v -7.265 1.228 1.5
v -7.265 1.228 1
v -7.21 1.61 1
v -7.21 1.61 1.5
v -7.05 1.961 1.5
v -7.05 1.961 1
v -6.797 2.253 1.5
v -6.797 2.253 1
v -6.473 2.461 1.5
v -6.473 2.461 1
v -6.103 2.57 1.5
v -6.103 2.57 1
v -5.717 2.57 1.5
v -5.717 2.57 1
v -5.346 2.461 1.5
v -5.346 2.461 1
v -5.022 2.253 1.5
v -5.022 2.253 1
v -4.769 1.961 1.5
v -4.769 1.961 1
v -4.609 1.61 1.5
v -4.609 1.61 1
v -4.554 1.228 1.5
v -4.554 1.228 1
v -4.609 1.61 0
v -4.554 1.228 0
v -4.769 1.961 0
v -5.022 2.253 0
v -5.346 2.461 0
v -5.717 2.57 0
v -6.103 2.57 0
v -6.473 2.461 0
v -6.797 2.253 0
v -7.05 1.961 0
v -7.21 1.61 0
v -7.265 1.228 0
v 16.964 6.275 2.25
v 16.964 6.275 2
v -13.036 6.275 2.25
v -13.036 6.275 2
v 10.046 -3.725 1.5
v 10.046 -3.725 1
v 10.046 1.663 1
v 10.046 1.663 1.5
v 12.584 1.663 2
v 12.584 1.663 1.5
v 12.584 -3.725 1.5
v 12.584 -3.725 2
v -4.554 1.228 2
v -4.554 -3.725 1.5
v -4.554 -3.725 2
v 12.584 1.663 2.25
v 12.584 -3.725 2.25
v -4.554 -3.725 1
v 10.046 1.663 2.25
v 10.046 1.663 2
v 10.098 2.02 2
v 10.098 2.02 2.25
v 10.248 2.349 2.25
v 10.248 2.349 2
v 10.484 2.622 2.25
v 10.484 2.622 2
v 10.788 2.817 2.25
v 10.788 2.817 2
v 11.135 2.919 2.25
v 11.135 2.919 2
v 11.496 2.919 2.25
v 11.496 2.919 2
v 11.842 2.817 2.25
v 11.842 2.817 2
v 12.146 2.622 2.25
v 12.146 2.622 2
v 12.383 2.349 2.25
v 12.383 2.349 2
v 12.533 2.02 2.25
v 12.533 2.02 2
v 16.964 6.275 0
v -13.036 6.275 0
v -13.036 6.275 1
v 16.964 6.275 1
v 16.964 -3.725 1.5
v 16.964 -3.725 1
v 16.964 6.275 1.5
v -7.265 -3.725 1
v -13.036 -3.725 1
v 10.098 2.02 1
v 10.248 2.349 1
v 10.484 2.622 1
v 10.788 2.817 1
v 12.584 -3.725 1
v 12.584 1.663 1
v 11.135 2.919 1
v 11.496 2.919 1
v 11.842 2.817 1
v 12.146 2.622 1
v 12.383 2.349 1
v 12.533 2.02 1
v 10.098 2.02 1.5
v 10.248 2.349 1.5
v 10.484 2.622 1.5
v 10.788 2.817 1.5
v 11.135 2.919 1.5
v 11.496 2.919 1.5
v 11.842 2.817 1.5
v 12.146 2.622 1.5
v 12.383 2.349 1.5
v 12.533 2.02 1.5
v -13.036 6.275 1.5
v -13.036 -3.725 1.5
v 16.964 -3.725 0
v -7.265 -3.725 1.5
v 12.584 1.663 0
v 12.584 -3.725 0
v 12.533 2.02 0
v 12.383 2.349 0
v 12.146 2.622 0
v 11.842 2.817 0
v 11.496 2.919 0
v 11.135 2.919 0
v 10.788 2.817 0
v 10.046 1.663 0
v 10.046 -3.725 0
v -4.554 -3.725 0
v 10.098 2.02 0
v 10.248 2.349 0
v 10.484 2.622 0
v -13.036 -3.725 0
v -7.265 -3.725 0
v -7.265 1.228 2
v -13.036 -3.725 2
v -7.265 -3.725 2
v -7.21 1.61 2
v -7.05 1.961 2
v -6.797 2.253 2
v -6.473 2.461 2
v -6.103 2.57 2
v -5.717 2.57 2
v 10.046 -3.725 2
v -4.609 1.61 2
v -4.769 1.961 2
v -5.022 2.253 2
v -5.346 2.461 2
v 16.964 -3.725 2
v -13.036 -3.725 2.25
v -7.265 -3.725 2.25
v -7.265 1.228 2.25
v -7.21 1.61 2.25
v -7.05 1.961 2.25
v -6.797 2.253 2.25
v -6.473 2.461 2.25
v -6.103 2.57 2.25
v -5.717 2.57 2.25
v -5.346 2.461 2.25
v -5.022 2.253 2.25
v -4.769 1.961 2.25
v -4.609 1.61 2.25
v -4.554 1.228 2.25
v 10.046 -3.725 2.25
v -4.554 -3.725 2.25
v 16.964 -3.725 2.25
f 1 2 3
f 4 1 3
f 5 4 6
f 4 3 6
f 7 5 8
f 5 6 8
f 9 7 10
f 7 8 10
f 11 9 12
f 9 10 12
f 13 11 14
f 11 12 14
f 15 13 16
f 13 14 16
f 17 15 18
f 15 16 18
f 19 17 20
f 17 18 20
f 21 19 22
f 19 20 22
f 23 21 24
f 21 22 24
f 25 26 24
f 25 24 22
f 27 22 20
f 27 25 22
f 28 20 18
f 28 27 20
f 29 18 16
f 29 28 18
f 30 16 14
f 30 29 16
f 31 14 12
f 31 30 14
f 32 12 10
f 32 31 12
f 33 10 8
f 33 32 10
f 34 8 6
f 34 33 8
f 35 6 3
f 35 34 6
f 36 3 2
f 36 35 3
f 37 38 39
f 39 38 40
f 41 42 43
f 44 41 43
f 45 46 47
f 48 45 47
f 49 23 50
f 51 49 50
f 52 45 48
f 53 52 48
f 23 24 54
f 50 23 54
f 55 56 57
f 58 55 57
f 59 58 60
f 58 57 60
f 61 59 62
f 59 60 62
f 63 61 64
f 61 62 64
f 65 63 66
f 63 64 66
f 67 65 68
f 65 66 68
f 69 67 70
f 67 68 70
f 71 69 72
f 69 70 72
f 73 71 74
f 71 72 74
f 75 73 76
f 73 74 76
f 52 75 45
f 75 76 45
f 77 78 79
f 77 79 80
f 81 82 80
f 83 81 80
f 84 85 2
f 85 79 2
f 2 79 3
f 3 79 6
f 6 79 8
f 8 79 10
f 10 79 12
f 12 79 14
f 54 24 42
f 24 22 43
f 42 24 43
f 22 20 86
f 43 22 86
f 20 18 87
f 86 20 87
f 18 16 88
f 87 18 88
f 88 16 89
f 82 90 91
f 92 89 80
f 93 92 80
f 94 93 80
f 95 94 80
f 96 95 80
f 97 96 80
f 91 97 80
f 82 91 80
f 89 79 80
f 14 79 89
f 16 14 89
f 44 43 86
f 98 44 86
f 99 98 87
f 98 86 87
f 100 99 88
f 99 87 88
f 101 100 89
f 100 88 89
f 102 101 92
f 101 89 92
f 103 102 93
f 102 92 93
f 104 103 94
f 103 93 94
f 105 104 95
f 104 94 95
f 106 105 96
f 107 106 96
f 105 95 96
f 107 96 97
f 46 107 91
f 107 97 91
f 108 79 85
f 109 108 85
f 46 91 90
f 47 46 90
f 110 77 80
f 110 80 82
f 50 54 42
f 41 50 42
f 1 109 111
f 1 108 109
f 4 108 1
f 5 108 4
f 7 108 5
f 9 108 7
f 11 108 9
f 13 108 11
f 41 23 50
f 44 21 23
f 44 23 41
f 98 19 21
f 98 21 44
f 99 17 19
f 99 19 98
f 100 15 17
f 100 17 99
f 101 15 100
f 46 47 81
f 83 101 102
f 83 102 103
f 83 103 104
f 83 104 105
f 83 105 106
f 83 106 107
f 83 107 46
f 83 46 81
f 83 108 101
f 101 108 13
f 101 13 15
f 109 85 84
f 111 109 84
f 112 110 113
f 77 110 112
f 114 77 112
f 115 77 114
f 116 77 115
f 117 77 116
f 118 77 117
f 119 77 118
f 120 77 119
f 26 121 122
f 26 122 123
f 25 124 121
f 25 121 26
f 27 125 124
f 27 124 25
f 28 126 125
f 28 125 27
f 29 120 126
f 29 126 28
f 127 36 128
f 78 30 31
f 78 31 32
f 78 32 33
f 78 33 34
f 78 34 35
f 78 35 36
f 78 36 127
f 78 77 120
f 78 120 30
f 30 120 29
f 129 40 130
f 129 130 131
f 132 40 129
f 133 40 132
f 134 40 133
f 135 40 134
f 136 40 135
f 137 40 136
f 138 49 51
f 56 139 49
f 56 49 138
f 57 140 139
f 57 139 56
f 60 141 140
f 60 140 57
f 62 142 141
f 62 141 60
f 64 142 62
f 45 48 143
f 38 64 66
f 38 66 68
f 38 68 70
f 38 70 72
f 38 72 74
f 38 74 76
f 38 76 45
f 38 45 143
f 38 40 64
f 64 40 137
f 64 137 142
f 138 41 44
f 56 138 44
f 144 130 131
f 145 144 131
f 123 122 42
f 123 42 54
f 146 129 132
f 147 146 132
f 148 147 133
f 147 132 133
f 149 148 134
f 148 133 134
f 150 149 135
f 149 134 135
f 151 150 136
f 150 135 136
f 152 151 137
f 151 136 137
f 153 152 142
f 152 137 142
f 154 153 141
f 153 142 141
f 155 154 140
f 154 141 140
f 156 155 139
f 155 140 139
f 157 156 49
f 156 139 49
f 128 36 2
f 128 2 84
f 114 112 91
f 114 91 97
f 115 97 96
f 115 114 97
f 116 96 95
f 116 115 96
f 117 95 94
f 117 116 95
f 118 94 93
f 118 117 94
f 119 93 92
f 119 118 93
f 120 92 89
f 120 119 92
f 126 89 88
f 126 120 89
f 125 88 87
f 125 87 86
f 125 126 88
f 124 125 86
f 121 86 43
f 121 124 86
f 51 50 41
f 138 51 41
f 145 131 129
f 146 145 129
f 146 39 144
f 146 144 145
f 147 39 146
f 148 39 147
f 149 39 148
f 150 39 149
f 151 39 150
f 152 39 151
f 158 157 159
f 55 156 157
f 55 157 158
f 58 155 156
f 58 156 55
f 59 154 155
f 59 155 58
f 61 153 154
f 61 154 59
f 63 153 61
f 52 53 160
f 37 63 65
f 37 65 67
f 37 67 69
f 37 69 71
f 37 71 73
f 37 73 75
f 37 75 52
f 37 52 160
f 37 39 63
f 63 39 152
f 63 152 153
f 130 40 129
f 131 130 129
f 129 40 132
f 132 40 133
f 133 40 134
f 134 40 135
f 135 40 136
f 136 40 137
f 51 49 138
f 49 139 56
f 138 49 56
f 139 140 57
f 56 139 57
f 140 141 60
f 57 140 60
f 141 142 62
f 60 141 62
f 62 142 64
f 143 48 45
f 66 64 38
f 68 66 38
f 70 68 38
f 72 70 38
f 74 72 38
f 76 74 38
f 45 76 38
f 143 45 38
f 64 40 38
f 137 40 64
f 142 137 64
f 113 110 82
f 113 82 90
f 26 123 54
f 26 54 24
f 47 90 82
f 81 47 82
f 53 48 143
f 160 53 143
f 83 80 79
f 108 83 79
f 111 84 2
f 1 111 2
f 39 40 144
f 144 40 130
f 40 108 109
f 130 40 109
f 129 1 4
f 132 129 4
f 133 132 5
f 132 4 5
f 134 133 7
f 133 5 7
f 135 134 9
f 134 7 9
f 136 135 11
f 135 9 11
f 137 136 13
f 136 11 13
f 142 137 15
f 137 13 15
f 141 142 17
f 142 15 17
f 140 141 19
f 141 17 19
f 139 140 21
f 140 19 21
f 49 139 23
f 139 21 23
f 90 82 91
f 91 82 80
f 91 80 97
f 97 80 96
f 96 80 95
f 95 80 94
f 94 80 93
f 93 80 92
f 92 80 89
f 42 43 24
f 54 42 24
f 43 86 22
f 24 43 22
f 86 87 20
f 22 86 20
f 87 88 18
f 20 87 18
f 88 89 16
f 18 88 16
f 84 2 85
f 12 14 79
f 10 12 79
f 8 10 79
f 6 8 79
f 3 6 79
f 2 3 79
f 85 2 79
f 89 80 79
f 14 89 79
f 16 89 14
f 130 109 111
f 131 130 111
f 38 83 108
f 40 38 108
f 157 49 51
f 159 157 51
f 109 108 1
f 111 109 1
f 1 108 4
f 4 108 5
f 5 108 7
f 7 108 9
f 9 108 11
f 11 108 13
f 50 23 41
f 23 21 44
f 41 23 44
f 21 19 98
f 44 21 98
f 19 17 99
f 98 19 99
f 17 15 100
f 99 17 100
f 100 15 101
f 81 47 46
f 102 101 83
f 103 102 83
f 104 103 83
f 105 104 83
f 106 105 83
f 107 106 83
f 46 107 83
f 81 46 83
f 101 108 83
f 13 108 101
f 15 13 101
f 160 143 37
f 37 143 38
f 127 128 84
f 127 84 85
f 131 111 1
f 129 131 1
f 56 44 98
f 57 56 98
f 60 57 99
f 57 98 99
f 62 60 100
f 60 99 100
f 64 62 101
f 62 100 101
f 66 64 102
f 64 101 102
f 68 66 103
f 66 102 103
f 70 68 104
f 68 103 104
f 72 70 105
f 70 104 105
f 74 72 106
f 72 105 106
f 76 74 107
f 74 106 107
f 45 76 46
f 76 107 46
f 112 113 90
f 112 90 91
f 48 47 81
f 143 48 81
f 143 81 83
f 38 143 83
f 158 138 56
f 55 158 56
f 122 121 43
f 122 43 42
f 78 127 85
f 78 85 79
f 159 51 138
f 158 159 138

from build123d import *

# Parameters (mm, degrees)
BOSS_EXTRUDE1_DEPTH = 1
BOSS_EXTRUDE2_DEPTH = 0.5
BOSS_EXTRUDE3_DEPTH = 0.5
BOSS_EXTRUDE4_DEPTH = 0.25


with BuildPart() as part:
    # Sketch1 → Boss-Extrude1 (new body)
    with BuildSketch(Plane.XY):
        with BuildLine():
            Line((-13.035921205, -3.725376593), (-13.035921205, 6.274623407))
            Line((-13.035921205, 6.274623407), (16.964078795, 6.274623407))
            Line((16.964078795, 6.274623407), (16.964078795, -3.725376593))
            Line((16.964078795, -3.725376593), (12.58400927, -3.725376593))
            Line((12.58400927, -3.725376593), (12.58400927, 1.662804171))
            ThreePointArc((12.58400927, 1.662804171), (11.315179606, 2.931633835), (10.046349942, 1.662804171))
            Line((10.046349942, 1.662804171), (10.046349942, -3.725376593))
            Line((10.046349942, -3.725376593), (-4.553881808, -3.725376593))
            Line((-4.553881808, -3.725376593), (-4.553881808, 1.228273465))
            ThreePointArc((-4.553881808, 1.228273465), (-5.909617613, 2.58400927), (-7.265353418, 1.228273465))
            Line((-7.265353418, 1.228273465), (-7.265353418, -3.725376593))
            Line((-7.265353418, -3.725376593), (-13.035921205, -3.725376593))
        make_face()
    extrude(amount=BOSS_EXTRUDE1_DEPTH)


with BuildPart() as body_2:
    # Sketch2 → Boss-Extrude2 (new body)
    with BuildSketch(Plane.XY.offset(1)):
        with BuildLine():
            Line((-13.035921205, -3.725376593), (-7.265353418, -3.725376593))
            Line((-7.265353418, -3.725376593), (-7.265353418, 1.228273465))
            ThreePointArc((-7.265353418, 1.228273465), (-5.909617613, 2.58400927), (-4.553881808, 1.228273465))
            Line((-4.553881808, 1.228273465), (-4.553881808, -3.725376593))
            Line((-4.553881808, -3.725376593), (10.046349942, -3.725376593))
            Line((10.046349942, -3.725376593), (10.046349942, 1.662804171))
            ThreePointArc((10.046349942, 1.662804171), (11.315179606, 2.931633835), (12.58400927, 1.662804171))
            Line((12.58400927, 1.662804171), (12.58400927, -3.725376593))
            Line((12.58400927, -3.725376593), (16.964078795, -3.725376593))
            Line((16.964078795, -3.725376593), (16.964078795, 6.274623407))
            Line((16.964078795, 6.274623407), (-13.035921205, 6.274623407))
            Line((-13.035921205, 6.274623407), (-13.035921205, -3.725376593))
        make_face()
    extrude(amount=BOSS_EXTRUDE2_DEPTH)


with BuildPart() as body_3:
    # Sketch3 → Boss-Extrude3 (new body)
    with BuildSketch(Plane.XY.offset(1.5)):
        with BuildLine():
            Line((-13.035921205, 6.274623407), (-13.035921205, -3.725376593))
            Line((-13.035921205, -3.725376593), (-7.265353418, -3.725376593))
            Line((-7.265353418, -3.725376593), (-7.265353418, 1.228273465))
            ThreePointArc((-7.265353418, 1.228273465), (-5.909617613, 2.58400927), (-4.553881808, 1.228273465))
            Line((-4.553881808, 1.228273465), (-4.553881808, -3.725376593))
            Line((-4.553881808, -3.725376593), (10.046349942, -3.725376593))
            Line((10.046349942, -3.725376593), (10.046349942, 1.662804171))
            ThreePointArc((10.046349942, 1.662804171), (11.315179606, 2.931633835), (12.58400927, 1.662804171))
            Line((12.58400927, 1.662804171), (12.58400927, -3.725376593))
            Line((12.58400927, -3.725376593), (16.964078795, -3.725376593))
            Line((16.964078795, -3.725376593), (16.964078795, 6.274623407))
            Line((16.964078795, 6.274623407), (-13.035921205, 6.274623407))
        make_face()
    extrude(amount=BOSS_EXTRUDE3_DEPTH)


with BuildPart() as body_4:
    # Sketch4 → Boss-Extrude4 (new body)
    with BuildSketch(Plane.XY.offset(2)):
        with BuildLine():
            Line((16.964078795, 6.274623407), (-13.035921205, 6.274623407))
            Line((-13.035921205, 6.274623407), (-13.035921205, -3.725376593))
            Line((-13.035921205, -3.725376593), (-7.265353418, -3.725376593))
            Line((-7.265353418, -3.725376593), (-7.265353418, 1.228273465))
            ThreePointArc((-7.265353418, 1.228273465), (-5.909617613, 2.58400927), (-4.553881808, 1.228273465))
            Line((-4.553881808, 1.228273465), (-4.553881808, -3.725376593))
            Line((-4.553881808, -3.725376593), (10.046349942, -3.725376593))
            Line((10.046349942, -3.725376593), (10.046349942, 1.662804171))
            ThreePointArc((10.046349942, 1.662804171), (11.315179606, 2.931633835), (12.58400927, 1.662804171))
            Line((12.58400927, 1.662804171), (12.58400927, -3.725376593))
            Line((12.58400927, -3.725376593), (16.964078795, -3.725376593))
            Line((16.964078795, -3.725376593), (16.964078795, 6.274623407))
        make_face()
    extrude(amount=BOSS_EXTRUDE4_DEPTH)


solid = Compound([part.part, body_2.part, body_3.part, body_4.part])
